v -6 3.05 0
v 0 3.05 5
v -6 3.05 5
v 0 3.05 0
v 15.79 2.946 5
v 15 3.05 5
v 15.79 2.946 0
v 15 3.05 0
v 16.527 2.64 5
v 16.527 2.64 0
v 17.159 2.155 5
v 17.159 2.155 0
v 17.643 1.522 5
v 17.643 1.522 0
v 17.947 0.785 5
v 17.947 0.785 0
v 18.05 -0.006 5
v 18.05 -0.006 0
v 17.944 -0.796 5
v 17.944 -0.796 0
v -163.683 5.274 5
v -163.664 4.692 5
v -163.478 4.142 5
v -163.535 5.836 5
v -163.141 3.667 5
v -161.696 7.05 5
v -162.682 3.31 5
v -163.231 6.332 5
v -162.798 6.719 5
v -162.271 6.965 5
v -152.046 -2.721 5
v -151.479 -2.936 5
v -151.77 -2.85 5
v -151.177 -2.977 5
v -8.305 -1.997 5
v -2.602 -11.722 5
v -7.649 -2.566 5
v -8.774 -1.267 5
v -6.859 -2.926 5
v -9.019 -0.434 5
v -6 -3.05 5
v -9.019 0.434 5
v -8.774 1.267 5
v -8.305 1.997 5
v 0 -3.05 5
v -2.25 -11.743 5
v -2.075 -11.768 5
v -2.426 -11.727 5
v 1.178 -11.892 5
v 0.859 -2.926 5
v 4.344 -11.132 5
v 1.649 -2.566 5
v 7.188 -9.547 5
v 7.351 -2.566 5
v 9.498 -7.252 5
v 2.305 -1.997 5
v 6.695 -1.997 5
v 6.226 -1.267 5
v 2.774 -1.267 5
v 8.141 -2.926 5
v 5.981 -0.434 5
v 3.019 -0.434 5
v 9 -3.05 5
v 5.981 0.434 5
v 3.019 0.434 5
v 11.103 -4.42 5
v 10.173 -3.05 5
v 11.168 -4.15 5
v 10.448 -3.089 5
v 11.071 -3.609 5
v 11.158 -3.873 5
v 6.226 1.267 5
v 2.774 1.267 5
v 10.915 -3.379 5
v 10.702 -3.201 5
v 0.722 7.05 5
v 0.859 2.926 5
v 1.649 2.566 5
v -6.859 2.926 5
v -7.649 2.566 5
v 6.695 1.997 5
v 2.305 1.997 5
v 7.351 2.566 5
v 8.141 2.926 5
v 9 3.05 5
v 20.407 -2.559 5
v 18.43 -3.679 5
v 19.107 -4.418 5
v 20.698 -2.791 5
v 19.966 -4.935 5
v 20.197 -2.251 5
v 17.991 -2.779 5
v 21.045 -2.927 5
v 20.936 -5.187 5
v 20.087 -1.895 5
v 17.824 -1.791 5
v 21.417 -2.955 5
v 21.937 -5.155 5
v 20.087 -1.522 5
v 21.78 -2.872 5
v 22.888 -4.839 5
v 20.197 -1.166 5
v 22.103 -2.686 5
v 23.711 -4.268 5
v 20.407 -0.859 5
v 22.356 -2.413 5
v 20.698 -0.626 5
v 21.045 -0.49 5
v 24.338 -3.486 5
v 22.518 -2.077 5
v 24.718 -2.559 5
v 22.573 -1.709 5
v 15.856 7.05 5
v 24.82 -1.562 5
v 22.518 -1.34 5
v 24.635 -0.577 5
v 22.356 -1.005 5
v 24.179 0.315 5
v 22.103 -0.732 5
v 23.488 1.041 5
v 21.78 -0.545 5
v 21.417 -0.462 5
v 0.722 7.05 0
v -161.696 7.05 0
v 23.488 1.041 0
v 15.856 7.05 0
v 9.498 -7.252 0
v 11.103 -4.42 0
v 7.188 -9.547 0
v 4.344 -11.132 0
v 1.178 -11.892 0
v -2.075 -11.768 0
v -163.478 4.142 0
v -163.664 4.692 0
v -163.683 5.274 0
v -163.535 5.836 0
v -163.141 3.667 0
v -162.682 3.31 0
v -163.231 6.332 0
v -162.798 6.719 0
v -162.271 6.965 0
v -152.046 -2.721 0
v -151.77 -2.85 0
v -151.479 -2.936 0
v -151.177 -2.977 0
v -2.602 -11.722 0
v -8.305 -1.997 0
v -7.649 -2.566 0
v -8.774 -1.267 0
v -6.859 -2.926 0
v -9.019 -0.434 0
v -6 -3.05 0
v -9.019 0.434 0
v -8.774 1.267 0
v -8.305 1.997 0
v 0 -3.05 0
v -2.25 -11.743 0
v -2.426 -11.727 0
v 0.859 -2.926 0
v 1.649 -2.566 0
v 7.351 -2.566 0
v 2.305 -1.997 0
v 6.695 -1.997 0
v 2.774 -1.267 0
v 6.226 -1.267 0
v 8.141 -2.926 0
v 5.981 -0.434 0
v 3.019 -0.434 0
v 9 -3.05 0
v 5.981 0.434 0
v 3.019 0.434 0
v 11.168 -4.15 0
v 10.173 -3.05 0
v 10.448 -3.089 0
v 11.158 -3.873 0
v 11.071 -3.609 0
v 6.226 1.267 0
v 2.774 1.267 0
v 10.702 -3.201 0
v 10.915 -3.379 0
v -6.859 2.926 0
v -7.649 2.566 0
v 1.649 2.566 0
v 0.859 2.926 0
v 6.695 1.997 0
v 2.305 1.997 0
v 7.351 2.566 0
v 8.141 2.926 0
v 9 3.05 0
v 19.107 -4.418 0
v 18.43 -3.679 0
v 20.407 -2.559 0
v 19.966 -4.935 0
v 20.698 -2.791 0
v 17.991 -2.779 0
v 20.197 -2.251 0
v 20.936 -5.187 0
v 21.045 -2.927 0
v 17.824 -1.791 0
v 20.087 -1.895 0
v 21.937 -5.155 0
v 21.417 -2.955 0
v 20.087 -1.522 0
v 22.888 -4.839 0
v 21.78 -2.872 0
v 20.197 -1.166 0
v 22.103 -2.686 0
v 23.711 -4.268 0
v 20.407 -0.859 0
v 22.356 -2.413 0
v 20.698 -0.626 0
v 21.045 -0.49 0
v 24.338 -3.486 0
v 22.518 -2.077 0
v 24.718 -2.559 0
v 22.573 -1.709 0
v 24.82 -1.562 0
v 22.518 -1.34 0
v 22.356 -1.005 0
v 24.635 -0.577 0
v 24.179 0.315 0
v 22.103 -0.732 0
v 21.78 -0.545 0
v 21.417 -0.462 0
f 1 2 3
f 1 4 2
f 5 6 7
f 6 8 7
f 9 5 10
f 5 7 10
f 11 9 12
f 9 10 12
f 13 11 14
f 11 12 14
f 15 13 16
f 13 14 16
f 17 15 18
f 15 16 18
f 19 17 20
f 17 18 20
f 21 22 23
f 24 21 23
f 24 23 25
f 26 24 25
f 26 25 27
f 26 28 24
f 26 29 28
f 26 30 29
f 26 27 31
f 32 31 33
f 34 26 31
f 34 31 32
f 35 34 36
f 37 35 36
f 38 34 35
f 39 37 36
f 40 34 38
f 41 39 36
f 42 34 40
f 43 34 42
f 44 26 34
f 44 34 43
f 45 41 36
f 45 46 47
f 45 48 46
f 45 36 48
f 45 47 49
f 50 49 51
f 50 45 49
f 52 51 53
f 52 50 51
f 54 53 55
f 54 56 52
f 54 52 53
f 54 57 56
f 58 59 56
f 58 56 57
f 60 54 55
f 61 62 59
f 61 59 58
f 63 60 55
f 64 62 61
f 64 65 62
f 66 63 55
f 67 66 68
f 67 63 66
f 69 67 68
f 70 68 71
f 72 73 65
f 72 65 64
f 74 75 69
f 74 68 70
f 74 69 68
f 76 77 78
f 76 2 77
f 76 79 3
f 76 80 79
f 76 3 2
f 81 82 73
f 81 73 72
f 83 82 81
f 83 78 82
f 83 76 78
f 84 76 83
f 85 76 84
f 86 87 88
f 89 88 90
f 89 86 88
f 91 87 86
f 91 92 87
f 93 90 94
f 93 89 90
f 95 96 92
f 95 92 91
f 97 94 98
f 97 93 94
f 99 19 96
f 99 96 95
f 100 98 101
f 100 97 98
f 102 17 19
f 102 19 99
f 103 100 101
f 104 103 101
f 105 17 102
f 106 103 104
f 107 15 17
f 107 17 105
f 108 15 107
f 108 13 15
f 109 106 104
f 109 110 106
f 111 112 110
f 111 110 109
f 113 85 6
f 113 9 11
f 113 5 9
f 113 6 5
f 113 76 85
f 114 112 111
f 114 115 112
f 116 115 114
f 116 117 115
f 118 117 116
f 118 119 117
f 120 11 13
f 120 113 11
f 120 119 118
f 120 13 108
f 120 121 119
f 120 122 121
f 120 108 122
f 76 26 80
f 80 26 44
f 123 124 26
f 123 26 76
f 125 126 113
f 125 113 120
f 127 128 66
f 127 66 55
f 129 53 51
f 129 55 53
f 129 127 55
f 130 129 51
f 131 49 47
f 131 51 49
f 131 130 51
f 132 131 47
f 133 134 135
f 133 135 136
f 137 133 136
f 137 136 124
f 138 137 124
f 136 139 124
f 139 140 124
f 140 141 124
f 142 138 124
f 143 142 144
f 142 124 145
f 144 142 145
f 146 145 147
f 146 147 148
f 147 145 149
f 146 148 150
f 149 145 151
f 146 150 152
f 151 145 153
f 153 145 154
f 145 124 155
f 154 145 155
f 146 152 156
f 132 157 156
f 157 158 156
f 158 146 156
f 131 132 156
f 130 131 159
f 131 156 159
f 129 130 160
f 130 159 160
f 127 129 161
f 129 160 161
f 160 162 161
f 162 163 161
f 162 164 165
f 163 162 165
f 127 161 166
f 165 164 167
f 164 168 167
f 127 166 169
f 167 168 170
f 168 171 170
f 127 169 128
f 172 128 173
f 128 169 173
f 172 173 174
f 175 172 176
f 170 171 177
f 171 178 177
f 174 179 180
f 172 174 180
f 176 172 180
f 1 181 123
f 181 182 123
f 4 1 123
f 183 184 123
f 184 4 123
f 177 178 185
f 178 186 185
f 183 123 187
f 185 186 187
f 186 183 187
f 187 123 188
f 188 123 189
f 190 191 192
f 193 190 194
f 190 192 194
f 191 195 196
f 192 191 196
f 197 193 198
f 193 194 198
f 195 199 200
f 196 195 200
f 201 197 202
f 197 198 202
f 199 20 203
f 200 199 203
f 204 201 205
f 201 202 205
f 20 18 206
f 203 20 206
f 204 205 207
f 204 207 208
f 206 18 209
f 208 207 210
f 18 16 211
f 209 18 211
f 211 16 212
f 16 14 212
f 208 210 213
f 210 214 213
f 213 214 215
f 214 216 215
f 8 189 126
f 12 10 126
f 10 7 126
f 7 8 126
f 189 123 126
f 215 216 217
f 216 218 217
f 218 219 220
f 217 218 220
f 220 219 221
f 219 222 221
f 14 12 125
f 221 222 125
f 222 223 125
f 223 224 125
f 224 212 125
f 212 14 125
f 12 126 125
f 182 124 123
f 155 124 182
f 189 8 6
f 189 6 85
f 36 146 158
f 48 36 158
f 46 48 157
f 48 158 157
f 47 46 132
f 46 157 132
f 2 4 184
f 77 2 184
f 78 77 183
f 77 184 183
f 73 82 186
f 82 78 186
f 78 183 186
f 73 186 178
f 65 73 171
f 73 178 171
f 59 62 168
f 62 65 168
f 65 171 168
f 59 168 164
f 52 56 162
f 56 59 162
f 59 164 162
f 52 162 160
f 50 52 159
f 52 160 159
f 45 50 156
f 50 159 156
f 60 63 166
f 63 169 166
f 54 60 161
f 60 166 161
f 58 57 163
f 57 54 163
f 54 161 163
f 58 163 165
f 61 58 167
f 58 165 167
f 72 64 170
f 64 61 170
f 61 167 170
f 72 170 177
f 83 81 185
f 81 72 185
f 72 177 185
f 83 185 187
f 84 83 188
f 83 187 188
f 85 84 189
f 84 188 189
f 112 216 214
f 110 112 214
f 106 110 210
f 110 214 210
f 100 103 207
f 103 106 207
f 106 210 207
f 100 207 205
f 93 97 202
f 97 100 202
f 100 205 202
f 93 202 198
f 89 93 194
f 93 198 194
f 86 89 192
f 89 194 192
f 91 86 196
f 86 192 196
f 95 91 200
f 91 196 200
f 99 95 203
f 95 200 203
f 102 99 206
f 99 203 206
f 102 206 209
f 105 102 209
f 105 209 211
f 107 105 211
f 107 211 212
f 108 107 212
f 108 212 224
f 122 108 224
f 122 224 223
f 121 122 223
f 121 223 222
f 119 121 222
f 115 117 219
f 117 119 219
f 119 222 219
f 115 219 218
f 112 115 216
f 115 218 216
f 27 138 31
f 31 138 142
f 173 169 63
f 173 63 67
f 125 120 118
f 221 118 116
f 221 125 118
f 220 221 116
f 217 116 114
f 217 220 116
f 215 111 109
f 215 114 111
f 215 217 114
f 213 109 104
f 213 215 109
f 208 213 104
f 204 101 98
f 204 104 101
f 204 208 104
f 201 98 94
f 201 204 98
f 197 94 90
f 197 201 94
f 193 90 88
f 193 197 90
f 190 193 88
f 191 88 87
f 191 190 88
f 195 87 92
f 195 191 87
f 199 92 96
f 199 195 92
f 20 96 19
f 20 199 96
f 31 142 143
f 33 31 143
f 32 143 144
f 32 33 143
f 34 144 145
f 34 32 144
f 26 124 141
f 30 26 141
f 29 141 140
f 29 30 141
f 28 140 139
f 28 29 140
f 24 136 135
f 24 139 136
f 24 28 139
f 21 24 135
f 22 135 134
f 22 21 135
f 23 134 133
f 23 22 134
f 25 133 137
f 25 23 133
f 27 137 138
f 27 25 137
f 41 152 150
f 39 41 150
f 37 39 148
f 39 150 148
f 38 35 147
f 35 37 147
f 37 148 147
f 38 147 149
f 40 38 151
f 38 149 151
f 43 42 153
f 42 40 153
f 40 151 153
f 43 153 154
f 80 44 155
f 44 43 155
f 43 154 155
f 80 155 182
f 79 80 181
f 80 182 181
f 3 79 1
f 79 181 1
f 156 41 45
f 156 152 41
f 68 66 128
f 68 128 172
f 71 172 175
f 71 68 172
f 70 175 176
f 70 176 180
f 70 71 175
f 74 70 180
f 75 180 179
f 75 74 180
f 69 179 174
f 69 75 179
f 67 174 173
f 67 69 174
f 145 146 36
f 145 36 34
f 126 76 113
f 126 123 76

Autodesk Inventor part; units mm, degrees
ref_plane "YZ Plane" through (0, 0, 0) normal (1, 0, 0) x (0, 1, 0)
ref_plane "XZ Plane" through (0, 0, 0) normal (0, 1, 0) x (-1, 0, 0)
ref_plane "XY Plane" through (0, 0, 0) normal (0, 0, 1) x (1, 0, 0)
sketch "スケッチ1" plane through (0, 0, 0) normal (0, 0, 1) x (1, 0, 0)
  arc A0 (-2.6047, -14.7721) -> (15, 0) centre (0, 0) ccw construction
  arc A1 (-2.0751, -11.7685) -> (11.5542, -3.05) centre (0, 0) ccw
  arc A2 (-2.0751, -11.7685) -> (-2.602, -11.7221) centre (-2.6047, -14.7721) ccw
  line L0 (0, 0) -> (-6, 0) construction
  line L1 (0, 3.05) -> (-6, 3.05)
  line L2 (-6, -3.05) -> (0, -3.05)
  arc A3 (0, -3.05) -> (0, 3.05) centre (0, 0) ccw
  arc A4 (-6, 3.05) -> (-6, -3.05) centre (-6, 0) ccw
  line L3 (15, 0) -> (9, 0) construction
  line L4 (15, 3.05) -> (9, 3.05)
  arc A5 (9, 3.05) -> (9, -3.05) centre (9, 0) ccw
  line L5 (-169.2784, 7.05) -> (0.7216, 7.05)
  line L6 (-169.2784, 7.05) -> (-151.6413, -2.95)
  line L7 (-2.602, -11.7221) -> (-151.6413, -2.95)
  arc A6 (17.9444, -0.7957) -> (15, 3.05) centre (15, 0) ccw
  line L8 (9, -3.05) -> (11.5542, -3.05)
  line L9 (14.6866, -3.05) -> (14.3582, -3.05)
  circle A7 centre (21.3232, -1.7088) radius 1.25
  arc A8 (17.9444, -0.7957) -> (23.4882, 1.0412) centre (21.3232, -1.7088) ccw
  line L10 (0.7216, 7.05) -> (15.8557, 7.05)
  line L11 (15.8557, 7.05) -> (23.4882, 1.0412)
  point P0 (-3, 0)
  point P1 (12, 0)
  dimension "d0" = 15
  dimension "d1" = 6.1
  dimension "d2" = 6
  dimension "d3" = 6.1
  dimension "d4" = 6
  dimension "d5" = 6.1
  dimension "d6" = 100
  dimension "d8" = 4
  dimension "d9" = 10
  dimension "d17" = 2.5
  dimension "d20" = 170
extrude "押し出し1" add sketch "スケッチ1" along normal blind 5
fillet "フィレット1" radius 2 2 edges at (-169.2784, 7.05, 2.5) (-151.6413, -2.95, 2.5)
fillet "フィレット3" radius 1 1 edges at (11.5542, -3.05, 2.5)
properties part number "新型４ウイング" material "ポリカーボネート、クリア"
